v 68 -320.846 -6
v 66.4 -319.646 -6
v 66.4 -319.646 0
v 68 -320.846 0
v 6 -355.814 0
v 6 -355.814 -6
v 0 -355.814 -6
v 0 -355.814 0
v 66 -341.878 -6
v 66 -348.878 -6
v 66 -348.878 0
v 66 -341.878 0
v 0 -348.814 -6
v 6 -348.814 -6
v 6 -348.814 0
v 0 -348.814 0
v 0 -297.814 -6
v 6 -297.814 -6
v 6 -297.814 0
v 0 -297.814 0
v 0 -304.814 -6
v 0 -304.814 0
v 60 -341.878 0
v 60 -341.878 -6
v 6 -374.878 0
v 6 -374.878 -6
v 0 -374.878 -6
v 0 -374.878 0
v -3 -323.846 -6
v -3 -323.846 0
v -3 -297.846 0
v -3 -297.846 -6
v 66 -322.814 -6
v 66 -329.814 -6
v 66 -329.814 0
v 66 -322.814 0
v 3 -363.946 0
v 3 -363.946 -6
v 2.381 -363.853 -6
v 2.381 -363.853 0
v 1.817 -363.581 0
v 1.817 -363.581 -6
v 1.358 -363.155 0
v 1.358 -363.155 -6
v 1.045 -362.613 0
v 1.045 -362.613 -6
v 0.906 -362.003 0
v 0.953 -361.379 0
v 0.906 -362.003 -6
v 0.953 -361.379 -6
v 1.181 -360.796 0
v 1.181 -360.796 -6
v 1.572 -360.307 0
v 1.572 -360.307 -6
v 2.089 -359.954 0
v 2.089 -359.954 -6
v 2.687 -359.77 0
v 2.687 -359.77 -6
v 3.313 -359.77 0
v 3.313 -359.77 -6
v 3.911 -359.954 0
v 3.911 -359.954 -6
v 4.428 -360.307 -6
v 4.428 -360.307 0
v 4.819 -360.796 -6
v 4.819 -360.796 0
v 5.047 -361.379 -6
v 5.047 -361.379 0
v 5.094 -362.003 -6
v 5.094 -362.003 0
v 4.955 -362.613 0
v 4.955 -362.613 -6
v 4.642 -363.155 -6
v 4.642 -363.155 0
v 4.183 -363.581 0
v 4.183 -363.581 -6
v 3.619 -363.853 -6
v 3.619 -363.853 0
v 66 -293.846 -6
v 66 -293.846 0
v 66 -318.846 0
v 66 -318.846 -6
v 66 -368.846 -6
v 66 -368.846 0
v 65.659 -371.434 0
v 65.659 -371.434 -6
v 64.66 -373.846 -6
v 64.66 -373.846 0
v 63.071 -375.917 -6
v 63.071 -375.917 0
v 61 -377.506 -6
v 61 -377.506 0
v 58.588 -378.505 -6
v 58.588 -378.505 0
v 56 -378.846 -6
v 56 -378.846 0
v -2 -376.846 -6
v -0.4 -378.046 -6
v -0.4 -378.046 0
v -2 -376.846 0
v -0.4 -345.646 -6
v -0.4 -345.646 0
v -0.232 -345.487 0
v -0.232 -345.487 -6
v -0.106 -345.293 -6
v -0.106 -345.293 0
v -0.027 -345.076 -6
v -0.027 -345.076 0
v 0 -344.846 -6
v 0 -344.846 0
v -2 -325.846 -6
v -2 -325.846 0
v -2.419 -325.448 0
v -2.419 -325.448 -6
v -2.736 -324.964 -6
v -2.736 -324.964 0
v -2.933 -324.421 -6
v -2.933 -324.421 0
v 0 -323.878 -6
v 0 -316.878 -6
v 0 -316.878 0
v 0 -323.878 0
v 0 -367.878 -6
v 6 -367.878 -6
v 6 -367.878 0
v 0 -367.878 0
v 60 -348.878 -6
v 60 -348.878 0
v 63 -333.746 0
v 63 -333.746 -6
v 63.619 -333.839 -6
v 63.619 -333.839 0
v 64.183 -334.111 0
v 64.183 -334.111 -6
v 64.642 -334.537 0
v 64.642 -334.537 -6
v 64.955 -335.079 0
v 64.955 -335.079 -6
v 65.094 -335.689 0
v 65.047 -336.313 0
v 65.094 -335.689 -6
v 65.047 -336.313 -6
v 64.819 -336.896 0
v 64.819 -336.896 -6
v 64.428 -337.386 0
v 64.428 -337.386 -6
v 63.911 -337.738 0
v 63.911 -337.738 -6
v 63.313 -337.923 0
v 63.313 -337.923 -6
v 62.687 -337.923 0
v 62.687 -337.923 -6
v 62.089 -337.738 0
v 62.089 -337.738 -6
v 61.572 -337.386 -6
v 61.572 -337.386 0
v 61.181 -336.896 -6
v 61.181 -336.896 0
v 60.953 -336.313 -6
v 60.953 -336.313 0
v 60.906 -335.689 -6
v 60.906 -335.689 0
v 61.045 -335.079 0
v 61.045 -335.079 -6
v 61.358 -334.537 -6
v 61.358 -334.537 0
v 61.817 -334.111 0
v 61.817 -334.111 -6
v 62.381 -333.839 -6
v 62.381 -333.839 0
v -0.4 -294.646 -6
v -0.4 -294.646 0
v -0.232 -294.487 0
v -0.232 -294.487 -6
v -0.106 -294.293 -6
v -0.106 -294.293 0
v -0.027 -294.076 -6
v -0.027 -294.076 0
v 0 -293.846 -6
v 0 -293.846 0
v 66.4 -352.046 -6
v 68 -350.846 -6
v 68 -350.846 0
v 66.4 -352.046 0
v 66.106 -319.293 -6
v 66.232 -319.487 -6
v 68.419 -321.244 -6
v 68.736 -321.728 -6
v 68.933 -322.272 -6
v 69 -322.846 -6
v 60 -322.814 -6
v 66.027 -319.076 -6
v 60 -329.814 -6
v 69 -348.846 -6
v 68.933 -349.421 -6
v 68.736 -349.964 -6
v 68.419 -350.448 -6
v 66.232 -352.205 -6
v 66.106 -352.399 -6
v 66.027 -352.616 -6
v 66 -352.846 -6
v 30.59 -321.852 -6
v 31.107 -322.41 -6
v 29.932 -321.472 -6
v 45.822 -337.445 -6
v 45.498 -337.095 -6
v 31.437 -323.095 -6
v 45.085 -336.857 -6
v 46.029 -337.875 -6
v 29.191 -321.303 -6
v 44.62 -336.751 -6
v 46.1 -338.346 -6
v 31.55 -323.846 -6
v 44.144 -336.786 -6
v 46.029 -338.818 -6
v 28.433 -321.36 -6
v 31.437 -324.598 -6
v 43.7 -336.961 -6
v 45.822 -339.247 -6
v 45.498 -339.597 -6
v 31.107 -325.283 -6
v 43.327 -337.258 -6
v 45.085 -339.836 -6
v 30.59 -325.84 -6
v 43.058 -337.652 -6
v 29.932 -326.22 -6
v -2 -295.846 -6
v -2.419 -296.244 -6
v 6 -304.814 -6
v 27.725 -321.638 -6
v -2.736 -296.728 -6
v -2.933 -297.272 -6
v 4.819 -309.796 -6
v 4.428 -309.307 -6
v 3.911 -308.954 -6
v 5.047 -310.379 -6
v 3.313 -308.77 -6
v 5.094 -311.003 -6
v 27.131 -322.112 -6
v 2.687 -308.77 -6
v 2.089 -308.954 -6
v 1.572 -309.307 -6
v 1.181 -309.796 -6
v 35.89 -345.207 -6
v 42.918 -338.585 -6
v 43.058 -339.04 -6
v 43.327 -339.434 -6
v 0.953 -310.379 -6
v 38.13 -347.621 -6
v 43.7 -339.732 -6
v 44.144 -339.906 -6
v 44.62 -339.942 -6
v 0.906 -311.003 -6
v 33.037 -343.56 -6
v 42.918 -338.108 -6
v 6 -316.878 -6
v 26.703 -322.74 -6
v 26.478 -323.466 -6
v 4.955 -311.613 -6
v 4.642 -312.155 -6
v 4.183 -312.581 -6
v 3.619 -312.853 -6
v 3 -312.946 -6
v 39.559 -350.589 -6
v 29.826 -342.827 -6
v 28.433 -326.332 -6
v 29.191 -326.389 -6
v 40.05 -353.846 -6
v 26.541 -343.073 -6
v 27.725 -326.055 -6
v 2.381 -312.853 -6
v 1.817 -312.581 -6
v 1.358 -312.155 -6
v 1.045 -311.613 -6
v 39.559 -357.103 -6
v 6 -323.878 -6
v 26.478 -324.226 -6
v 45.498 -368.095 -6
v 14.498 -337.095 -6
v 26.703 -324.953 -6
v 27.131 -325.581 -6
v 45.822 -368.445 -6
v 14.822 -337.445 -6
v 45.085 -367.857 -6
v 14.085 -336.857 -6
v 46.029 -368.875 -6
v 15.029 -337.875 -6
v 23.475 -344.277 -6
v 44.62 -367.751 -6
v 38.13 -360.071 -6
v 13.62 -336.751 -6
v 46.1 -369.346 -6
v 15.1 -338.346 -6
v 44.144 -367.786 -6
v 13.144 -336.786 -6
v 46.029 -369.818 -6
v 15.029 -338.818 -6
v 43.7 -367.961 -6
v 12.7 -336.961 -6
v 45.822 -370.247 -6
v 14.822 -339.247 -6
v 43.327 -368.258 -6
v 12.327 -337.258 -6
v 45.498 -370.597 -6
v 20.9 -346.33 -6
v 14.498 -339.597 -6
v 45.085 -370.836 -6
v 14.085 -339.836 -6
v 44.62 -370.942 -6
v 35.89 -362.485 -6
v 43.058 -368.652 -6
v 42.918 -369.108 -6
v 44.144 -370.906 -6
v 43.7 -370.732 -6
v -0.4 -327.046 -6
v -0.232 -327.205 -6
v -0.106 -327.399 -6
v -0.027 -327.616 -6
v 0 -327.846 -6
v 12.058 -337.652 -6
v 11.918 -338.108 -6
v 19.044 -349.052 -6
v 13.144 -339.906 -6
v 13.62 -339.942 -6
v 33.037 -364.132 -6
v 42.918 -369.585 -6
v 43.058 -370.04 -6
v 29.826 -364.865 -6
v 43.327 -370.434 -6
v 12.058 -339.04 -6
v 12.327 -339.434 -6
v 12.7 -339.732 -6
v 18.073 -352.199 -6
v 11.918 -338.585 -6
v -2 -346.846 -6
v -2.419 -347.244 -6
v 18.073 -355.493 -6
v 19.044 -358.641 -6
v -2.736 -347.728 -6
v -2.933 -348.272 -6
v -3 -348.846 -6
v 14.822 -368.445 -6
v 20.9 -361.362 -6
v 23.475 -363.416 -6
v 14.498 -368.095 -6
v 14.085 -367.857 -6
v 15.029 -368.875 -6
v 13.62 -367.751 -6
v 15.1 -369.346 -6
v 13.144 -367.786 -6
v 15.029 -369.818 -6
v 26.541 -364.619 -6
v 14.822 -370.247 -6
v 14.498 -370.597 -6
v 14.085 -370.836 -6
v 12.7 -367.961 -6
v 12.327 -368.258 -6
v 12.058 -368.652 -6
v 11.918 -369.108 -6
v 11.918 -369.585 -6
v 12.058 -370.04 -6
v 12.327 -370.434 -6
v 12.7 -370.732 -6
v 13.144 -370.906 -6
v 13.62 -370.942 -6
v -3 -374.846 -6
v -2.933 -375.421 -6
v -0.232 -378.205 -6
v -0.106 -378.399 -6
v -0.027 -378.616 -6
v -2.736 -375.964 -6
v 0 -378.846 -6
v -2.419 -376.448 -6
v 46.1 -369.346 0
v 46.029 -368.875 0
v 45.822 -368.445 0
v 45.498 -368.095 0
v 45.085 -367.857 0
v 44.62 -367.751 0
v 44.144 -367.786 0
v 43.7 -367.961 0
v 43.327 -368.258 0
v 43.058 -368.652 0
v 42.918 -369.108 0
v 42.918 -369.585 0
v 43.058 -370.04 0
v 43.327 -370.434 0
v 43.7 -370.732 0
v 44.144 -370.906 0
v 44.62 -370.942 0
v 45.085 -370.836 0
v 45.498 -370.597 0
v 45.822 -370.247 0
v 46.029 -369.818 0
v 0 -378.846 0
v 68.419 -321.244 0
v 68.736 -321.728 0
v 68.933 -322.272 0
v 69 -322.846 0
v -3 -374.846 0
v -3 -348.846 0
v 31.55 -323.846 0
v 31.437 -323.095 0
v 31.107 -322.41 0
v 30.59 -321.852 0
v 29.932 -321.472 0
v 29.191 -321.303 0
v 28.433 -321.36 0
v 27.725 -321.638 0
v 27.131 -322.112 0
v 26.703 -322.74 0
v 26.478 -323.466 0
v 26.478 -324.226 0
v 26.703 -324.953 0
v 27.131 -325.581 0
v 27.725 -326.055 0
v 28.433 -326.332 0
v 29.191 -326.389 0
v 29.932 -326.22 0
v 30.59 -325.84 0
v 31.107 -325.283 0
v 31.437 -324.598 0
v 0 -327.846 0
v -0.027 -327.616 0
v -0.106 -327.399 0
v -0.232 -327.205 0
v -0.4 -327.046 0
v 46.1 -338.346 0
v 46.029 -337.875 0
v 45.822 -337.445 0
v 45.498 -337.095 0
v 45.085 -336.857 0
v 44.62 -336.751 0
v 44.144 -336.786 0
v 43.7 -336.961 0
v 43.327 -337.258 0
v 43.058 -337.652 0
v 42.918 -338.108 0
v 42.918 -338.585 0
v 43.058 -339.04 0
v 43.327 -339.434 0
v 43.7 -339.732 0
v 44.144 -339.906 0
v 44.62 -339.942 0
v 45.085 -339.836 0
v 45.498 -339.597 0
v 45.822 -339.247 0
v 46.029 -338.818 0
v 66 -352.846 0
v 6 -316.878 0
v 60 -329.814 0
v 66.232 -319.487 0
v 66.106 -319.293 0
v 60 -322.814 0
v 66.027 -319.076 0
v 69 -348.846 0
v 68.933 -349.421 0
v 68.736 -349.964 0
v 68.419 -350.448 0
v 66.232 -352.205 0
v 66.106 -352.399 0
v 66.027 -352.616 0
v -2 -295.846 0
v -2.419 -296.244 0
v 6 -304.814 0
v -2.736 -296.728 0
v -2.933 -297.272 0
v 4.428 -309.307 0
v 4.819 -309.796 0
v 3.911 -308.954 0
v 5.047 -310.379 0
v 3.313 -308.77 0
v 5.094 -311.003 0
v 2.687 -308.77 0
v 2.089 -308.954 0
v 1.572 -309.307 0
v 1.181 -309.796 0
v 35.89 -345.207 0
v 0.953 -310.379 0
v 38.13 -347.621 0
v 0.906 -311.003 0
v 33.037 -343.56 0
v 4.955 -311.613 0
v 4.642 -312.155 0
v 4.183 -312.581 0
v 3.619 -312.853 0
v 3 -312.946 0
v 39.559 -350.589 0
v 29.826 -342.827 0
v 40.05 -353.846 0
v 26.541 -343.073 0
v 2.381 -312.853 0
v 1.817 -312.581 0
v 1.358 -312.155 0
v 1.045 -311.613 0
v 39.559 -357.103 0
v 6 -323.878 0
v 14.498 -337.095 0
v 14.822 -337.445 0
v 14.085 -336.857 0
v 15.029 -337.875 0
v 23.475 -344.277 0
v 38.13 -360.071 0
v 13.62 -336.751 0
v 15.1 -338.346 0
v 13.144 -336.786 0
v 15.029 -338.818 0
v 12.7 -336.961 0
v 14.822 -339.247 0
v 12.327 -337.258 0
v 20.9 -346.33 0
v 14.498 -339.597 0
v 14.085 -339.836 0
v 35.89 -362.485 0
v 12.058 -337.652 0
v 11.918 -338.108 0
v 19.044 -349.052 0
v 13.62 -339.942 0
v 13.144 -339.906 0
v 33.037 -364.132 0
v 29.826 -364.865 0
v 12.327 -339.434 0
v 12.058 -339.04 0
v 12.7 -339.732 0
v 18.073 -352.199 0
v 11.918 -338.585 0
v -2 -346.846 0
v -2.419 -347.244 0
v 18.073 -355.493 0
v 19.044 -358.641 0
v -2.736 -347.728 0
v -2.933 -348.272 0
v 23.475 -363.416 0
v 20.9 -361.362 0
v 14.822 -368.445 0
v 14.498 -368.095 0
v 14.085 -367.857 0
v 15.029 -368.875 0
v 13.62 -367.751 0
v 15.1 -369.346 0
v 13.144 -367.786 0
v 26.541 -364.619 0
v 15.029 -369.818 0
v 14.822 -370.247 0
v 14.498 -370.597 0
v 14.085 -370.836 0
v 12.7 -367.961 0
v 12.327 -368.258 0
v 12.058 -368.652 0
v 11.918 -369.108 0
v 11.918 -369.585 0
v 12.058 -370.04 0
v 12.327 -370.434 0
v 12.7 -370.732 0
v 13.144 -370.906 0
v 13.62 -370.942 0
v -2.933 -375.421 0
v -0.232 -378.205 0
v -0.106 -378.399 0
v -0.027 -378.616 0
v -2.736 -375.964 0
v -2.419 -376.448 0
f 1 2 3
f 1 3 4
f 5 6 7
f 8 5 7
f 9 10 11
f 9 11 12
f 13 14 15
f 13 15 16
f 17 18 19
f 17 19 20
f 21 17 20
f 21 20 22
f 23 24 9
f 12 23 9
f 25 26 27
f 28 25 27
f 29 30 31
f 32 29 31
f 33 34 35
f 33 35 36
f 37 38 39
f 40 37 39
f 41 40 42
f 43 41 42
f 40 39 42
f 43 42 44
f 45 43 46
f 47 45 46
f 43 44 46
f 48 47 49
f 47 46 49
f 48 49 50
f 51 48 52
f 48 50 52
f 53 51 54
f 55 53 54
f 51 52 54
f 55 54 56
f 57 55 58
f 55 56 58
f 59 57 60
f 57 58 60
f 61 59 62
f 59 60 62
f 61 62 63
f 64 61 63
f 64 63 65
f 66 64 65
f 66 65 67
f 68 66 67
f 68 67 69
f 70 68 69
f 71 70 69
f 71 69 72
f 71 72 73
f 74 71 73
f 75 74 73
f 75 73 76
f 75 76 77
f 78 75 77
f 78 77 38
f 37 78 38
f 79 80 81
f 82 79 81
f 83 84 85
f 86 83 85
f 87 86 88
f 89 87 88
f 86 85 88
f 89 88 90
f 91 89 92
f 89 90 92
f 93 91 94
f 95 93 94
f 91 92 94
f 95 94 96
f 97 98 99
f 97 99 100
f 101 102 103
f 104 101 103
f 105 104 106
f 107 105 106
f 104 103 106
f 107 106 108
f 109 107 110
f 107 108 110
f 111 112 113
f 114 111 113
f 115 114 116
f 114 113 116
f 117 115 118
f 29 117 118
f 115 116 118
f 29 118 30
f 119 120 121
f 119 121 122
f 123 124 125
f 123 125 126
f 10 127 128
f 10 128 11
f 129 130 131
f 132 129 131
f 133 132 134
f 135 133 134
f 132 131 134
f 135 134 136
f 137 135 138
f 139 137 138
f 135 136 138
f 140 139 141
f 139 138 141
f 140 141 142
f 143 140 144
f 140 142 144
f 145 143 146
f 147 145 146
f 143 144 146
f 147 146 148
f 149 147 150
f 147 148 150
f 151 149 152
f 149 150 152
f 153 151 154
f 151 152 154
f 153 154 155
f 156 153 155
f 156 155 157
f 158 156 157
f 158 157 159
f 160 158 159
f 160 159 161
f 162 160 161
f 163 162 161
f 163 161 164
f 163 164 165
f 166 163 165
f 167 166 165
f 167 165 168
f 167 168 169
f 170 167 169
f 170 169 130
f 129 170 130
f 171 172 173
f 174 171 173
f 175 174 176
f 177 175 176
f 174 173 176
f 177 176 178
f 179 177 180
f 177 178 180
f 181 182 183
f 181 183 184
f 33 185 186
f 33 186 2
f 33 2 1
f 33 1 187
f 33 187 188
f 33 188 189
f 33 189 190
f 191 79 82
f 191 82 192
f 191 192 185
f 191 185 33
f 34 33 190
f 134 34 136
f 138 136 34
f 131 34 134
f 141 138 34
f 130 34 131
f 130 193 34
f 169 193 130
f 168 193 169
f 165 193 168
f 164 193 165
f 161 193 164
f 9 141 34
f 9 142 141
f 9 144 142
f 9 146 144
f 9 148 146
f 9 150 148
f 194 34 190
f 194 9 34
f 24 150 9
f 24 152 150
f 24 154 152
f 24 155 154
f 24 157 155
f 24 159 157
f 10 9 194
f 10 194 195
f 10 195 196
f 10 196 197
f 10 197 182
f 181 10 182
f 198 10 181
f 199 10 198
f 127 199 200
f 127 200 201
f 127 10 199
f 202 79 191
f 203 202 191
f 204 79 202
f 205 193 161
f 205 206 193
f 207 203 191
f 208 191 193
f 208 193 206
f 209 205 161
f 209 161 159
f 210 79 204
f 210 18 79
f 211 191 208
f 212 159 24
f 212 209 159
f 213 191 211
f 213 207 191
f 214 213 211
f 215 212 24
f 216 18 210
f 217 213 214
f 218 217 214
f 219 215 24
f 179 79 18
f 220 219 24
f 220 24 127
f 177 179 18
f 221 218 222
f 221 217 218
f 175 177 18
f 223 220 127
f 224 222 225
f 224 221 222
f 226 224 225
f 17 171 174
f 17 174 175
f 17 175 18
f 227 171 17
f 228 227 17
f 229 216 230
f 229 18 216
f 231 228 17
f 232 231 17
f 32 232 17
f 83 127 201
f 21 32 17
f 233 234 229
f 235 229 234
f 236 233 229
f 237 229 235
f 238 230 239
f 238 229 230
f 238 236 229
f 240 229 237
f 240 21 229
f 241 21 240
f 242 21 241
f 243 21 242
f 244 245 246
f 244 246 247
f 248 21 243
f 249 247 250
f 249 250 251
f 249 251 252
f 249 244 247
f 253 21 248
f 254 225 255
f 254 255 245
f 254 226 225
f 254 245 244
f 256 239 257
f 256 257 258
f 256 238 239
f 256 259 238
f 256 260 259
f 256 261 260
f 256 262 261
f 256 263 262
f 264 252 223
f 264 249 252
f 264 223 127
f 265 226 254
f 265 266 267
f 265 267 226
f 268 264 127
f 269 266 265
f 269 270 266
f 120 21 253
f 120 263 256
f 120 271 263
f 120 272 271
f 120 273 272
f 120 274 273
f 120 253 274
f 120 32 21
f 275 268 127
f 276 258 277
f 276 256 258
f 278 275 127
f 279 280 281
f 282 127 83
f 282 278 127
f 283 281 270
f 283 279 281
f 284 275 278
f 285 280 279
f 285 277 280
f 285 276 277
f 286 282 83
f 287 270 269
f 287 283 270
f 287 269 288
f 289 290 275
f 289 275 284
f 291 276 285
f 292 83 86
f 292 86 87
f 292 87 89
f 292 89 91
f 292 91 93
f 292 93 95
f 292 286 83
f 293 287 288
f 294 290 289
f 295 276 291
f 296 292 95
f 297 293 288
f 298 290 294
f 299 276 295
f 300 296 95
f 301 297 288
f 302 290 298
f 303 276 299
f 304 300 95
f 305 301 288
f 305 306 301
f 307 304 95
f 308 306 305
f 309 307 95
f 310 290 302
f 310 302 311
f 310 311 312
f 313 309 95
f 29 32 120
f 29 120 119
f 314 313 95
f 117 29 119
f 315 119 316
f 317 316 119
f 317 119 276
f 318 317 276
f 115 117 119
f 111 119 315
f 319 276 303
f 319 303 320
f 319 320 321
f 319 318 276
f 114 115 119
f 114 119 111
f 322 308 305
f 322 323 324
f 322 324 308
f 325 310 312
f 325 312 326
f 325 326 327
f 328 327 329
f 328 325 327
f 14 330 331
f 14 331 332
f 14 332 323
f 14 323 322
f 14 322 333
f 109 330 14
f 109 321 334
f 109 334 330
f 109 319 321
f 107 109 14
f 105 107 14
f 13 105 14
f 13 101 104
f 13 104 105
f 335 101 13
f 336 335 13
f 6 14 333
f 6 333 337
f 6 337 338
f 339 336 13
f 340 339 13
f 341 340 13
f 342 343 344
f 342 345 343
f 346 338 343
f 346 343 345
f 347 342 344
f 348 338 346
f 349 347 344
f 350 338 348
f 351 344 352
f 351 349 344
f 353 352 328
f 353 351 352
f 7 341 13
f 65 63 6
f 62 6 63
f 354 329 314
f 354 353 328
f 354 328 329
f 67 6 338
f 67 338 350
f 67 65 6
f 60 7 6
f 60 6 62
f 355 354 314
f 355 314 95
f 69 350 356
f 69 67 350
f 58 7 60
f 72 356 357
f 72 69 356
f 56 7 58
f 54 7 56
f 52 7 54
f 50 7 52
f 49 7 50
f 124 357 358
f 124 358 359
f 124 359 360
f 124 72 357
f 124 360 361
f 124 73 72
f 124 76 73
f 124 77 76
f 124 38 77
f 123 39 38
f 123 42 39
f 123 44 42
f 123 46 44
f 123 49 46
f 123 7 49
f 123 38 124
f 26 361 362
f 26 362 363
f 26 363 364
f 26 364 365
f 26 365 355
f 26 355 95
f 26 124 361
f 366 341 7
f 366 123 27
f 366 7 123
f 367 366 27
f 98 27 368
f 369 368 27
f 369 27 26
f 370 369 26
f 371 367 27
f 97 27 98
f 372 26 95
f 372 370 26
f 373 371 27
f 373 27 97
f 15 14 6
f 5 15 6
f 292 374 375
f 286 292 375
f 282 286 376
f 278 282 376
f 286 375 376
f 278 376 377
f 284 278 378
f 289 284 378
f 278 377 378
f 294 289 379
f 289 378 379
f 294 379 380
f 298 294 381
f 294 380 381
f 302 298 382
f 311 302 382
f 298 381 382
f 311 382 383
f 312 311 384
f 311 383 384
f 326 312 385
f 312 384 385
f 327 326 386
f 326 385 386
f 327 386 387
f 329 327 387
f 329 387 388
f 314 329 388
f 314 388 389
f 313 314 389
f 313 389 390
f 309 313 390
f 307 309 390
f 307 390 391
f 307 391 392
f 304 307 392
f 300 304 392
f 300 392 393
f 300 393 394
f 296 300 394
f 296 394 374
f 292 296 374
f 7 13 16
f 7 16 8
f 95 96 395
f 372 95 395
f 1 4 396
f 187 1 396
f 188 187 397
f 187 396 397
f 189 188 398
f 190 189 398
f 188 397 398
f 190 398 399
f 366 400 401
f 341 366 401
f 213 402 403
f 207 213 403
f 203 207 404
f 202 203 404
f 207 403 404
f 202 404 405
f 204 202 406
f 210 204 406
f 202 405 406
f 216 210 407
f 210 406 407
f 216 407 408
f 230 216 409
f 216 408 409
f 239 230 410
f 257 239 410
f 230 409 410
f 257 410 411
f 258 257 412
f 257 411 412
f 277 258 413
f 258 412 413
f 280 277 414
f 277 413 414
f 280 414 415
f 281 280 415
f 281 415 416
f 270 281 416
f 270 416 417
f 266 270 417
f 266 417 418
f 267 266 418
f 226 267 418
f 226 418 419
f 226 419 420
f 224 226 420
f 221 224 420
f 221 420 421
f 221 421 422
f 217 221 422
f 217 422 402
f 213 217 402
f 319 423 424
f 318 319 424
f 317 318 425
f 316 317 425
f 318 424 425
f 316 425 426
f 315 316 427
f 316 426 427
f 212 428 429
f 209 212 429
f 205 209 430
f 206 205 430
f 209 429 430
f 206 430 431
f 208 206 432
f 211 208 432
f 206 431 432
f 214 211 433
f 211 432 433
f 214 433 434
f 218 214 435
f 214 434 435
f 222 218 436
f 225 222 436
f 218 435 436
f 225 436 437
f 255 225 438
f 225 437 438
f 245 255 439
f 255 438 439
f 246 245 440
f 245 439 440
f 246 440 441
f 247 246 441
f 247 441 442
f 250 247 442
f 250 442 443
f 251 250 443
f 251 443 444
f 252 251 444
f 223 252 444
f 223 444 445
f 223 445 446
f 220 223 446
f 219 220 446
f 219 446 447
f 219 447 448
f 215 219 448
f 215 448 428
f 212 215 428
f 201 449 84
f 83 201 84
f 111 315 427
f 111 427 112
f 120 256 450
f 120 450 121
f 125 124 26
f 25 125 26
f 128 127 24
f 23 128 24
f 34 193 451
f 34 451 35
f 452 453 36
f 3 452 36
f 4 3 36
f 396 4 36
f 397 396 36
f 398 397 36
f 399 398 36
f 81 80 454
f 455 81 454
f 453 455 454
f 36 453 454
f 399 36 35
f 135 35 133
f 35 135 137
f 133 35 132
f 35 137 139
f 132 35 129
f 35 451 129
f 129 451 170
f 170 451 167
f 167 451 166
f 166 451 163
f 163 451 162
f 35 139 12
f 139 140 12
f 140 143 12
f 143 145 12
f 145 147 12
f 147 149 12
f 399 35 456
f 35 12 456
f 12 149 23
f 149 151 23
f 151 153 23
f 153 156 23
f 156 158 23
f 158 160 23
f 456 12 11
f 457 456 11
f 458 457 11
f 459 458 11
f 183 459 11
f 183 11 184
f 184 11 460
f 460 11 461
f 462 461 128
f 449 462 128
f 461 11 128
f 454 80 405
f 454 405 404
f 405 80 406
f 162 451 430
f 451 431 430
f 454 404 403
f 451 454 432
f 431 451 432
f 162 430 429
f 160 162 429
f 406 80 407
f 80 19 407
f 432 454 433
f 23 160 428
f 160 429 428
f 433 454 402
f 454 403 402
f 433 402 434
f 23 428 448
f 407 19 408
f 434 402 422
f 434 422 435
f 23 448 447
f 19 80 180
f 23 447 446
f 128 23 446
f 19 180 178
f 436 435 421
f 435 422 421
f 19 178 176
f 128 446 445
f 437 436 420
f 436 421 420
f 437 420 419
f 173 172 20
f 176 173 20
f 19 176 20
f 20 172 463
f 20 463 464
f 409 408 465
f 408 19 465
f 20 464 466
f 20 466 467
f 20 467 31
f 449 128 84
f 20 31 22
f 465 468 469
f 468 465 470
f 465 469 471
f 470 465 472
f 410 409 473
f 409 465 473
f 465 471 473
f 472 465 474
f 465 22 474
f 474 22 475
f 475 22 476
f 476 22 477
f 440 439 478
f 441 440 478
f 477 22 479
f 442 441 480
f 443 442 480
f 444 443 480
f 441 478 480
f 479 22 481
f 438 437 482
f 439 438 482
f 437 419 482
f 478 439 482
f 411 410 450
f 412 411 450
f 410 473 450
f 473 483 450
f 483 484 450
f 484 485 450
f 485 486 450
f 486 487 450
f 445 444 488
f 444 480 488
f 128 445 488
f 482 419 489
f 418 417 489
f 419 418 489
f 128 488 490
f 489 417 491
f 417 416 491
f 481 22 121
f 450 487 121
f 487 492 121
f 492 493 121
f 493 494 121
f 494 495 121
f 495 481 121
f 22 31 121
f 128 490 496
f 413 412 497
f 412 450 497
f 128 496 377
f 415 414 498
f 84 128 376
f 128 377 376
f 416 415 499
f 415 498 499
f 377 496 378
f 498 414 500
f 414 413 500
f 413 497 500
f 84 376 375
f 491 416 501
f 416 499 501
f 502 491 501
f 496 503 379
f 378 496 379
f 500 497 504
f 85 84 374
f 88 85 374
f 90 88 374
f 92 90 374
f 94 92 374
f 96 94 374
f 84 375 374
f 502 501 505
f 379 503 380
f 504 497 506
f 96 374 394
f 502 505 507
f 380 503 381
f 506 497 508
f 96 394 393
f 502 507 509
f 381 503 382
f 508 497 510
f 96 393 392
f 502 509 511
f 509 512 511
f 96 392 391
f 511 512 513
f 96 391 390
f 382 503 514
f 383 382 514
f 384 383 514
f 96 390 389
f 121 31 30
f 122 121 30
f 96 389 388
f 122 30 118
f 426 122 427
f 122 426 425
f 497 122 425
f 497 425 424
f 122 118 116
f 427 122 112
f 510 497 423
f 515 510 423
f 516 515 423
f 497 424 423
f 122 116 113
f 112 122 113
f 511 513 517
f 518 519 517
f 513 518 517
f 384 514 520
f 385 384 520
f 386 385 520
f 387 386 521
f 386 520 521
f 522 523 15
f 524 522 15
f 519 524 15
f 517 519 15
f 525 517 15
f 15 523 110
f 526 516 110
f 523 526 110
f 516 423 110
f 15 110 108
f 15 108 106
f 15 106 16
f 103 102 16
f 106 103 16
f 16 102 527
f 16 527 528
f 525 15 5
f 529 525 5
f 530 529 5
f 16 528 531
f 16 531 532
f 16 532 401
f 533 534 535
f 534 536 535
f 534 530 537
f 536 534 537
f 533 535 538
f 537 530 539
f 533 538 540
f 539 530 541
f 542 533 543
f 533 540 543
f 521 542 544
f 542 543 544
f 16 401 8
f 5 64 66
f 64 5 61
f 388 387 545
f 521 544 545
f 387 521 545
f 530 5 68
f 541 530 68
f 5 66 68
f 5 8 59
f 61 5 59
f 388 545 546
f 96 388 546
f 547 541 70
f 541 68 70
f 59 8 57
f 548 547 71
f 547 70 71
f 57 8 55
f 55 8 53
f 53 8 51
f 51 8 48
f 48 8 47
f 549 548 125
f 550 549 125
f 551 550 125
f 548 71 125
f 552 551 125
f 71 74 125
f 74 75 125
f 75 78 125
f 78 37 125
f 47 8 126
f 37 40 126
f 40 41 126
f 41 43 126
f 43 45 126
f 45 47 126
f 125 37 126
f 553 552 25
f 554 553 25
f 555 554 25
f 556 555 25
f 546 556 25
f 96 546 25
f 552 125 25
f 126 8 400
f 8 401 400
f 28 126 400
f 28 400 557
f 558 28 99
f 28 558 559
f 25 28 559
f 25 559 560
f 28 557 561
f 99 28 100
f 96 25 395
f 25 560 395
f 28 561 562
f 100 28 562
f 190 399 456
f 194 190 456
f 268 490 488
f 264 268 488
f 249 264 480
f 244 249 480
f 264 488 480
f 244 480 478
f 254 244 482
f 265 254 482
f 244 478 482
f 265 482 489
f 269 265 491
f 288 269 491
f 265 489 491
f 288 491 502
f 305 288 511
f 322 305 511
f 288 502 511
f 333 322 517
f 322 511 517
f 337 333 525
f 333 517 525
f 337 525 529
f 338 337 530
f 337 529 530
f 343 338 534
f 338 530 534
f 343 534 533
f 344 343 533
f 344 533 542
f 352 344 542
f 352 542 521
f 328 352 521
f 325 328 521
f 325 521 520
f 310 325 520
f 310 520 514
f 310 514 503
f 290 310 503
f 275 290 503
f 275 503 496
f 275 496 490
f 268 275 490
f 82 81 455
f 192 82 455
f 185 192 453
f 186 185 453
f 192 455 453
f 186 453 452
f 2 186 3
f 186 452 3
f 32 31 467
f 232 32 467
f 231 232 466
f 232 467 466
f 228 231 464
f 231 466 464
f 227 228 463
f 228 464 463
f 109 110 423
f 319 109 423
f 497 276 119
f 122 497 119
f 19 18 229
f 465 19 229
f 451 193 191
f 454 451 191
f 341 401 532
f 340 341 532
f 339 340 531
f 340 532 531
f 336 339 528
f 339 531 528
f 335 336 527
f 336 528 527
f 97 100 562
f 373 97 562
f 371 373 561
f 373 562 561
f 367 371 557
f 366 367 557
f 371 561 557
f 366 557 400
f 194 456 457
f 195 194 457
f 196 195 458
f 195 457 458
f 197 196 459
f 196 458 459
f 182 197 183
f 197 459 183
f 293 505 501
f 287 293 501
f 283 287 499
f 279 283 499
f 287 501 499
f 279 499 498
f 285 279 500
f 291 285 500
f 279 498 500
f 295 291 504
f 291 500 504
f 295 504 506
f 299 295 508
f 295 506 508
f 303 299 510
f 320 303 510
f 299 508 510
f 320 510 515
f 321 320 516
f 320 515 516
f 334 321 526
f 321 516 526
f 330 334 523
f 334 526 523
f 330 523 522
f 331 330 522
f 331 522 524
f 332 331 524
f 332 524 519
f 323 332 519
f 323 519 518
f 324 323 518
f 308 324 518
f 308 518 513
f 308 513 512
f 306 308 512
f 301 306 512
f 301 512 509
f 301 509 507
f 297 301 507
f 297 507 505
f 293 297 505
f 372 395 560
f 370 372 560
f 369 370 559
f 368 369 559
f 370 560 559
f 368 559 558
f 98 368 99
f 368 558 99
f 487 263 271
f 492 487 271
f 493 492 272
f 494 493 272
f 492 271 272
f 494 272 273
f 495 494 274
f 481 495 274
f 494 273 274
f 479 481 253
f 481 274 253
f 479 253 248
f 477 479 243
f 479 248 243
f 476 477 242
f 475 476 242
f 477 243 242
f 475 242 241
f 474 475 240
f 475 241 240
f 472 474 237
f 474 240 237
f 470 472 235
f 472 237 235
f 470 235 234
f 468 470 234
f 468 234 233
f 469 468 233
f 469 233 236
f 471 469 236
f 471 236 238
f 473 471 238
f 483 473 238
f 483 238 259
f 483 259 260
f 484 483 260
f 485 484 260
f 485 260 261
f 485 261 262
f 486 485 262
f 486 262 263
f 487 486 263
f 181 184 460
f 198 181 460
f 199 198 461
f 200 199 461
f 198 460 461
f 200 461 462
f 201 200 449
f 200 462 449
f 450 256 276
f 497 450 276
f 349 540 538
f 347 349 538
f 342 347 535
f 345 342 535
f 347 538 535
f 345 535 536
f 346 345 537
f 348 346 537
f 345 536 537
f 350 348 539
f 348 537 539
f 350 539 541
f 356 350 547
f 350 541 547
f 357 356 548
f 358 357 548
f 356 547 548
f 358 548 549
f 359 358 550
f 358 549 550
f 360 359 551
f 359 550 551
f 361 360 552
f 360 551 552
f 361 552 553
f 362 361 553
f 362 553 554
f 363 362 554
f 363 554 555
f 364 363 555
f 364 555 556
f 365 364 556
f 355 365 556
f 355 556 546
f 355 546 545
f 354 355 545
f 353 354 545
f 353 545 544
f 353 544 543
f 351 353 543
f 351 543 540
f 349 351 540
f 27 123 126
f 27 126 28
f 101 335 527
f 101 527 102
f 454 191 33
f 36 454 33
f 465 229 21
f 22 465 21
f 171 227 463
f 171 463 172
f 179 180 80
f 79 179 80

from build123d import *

# Parameters (mm, degrees)
EXTRUDE_1_DEPTH      = 6
SKETCH_2_R           = 11.05
SKETCH_2_R_2         = 1.6
SKETCH_2_R_3         = 2.55
CUT_EXTRUDE_1_DEPTH  = 7
EXTRUDE_2_DEPTH      = 6
SKETCH_3_R           = 2.1
SKETCH_3_W           = 7
SKETCH_3_H           = 6
CUT_EXTRUDE_11_DEPTH = 7
EXTRUDE_21_DEPTH     = 6
SKETCH_31_R          = 2.1
SKETCH_31_W          = 7
SKETCH_31_H          = 6
CUT_EXTRUDE_12_DEPTH = 7
EXTRUDE_24_DEPTH     = 6
SKETCH_34_R          = 2.1
SKETCH_34_W          = 7
SKETCH_34_H          = 6
CUT_EXTRUDE_15_DEPTH = 7


with BuildPart() as part:
    # Эскиз1 → Бобышка-Вытянуть1 (new body)
    with BuildSketch(Plane.XY):
        with BuildLine():
            Line((0, -293.846153846), (66, -293.846153846))
            Line((66, -293.846153846), (66, -368.846153846))
            ThreePointArc((66, -368.846153846), (63.071067812, -375.917221658), (56, -378.846153846))
            Line((56, -378.846153846), (0, -378.846153846))
            Line((0, -378.846153846), (0, -293.846153846))
        make_face()
    extrude(amount=-EXTRUDE_1_DEPTH)

    # Эскиз2 → Вырез-Вытянуть1 (cut, through all)
    with BuildSketch(Plane.XY):
        with Locations((29, -353.846153846)):
            Circle(SKETCH_2_R)
        with Locations((44.5, -369.346153846)):
            Circle(SKETCH_2_R_2)
        with Locations((13.5, -369.346153846)):
            Circle(SKETCH_2_R_2)
        with Locations((13.5, -338.346153846)):
            Circle(SKETCH_2_R_2)
        with Locations((44.5, -338.346153846)):
            Circle(SKETCH_2_R_2)
        with Locations((29, -323.846153846)):
            Circle(SKETCH_2_R_3)
    extrude(amount=-CUT_EXTRUDE_1_DEPTH, mode=Mode.SUBTRACT)

    # Эскиз21 → Бобышка-Вытянуть2 (add)
    with BuildSketch(Plane(origin=(16, -335.846153846, 0), x_dir=(0, 1, 0), z_dir=(0, 0, -1))):
        with BuildLine():
            Line((13, 53), (-13, 53))
            ThreePointArc((-13, 53), (-14.118033989, 52.736067977), (-15, 52))
            Line((-15, 52), (-16.2, 50.4))
            ThreePointArc((-16.2, 50.4), (-16.552786405, 50.105572809), (-17, 50))
            Line((-17, 50), (17, 50))
            ThreePointArc((17, 50), (16.552786405, 50.105572809), (16.2, 50.4))
            Line((16.2, 50.4), (15, 52))
            ThreePointArc((15, 52), (14.118033989, 52.736067977), (13, 53))
        make_face()
    extrude(amount=EXTRUDE_2_DEPTH)

    # Эскиз3 → Вырез-Вытянуть11 (cut, through all)
    with BuildSketch(Plane(origin=(16, -335.846153846, -6), x_dir=(0, 1, 0), z_dir=(0, 0, -1))):
        with Locations((0, 47)):
            Circle(SKETCH_3_R)
        with Locations((9.531849908, 47)):
            Rectangle(SKETCH_3_W, SKETCH_3_H)
        with Locations((-9.531849908, 47)):
            Rectangle(SKETCH_3_W, SKETCH_3_H)
    extrude(amount=-CUT_EXTRUDE_11_DEPTH, mode=Mode.SUBTRACT)

    # Эскиз22 → Бобышка-Вытянуть21 (add)
    with BuildSketch(Plane(origin=(50, -310.846153846, 0), x_dir=(0, -1, 0), z_dir=(0, 0, -1))):
        with BuildLine():
            Line((13, 53), (-13, 53))
            ThreePointArc((-13, 53), (-14.118033989, 52.736067977), (-15, 52))
            Line((-15, 52), (-16.2, 50.4))
            ThreePointArc((-16.2, 50.4), (-16.552786405, 50.105572809), (-17, 50))
            Line((-17, 50), (17, 50))
            ThreePointArc((17, 50), (16.552786405, 50.105572809), (16.2, 50.4))
            Line((16.2, 50.4), (15, 52))
            ThreePointArc((15, 52), (14.118033989, 52.736067977), (13, 53))
        make_face()
    extrude(amount=EXTRUDE_21_DEPTH)

    # Эскиз31 → Вырез-Вытянуть12 (cut, through all)
    with BuildSketch(Plane(origin=(50, -310.846153846, -6), x_dir=(0, -1, 0), z_dir=(0, 0, -1))):
        with Locations((0, 47)):
            Circle(SKETCH_31_R)
        with Locations((9.531849908, 47)):
            Rectangle(SKETCH_31_W, SKETCH_31_H)
        with Locations((-9.531849908, 47)):
            Rectangle(SKETCH_31_W, SKETCH_31_H)
    extrude(amount=-CUT_EXTRUDE_12_DEPTH, mode=Mode.SUBTRACT)

    # Эскиз24 → Бобышка-Вытянуть24 (add)
    with BuildSketch(Plane(origin=(50, -361.846153846, 0), x_dir=(0, -1, 0), z_dir=(0, 0, -1))):
        with BuildLine():
            Line((13, 53), (-13, 53))
            ThreePointArc((-13, 53), (-14.118033989, 52.736067977), (-15, 52))
            Line((-15, 52), (-16.2, 50.4))
            ThreePointArc((-16.2, 50.4), (-16.552786405, 50.105572809), (-17, 50))
            Line((-17, 50), (17, 50))
            ThreePointArc((17, 50), (16.552786405, 50.105572809), (16.2, 50.4))
            Line((16.2, 50.4), (15, 52))
            ThreePointArc((15, 52), (14.118033989, 52.736067977), (13, 53))
        make_face()
    extrude(amount=EXTRUDE_24_DEPTH)

    # Эскиз34 → Вырез-Вытянуть15 (cut, through all)
    with BuildSketch(Plane(origin=(50, -361.846153846, -6), x_dir=(0, -1, 0), z_dir=(0, 0, -1))):
        with Locations((0, 47)):
            Circle(SKETCH_34_R)
        with Locations((9.531849908, 47)):
            Rectangle(SKETCH_34_W, SKETCH_34_H)
        with Locations((-9.531849908, 47)):
            Rectangle(SKETCH_34_W, SKETCH_34_H)
    extrude(amount=-CUT_EXTRUDE_15_DEPTH, mode=Mode.SUBTRACT)


solid = part.part
